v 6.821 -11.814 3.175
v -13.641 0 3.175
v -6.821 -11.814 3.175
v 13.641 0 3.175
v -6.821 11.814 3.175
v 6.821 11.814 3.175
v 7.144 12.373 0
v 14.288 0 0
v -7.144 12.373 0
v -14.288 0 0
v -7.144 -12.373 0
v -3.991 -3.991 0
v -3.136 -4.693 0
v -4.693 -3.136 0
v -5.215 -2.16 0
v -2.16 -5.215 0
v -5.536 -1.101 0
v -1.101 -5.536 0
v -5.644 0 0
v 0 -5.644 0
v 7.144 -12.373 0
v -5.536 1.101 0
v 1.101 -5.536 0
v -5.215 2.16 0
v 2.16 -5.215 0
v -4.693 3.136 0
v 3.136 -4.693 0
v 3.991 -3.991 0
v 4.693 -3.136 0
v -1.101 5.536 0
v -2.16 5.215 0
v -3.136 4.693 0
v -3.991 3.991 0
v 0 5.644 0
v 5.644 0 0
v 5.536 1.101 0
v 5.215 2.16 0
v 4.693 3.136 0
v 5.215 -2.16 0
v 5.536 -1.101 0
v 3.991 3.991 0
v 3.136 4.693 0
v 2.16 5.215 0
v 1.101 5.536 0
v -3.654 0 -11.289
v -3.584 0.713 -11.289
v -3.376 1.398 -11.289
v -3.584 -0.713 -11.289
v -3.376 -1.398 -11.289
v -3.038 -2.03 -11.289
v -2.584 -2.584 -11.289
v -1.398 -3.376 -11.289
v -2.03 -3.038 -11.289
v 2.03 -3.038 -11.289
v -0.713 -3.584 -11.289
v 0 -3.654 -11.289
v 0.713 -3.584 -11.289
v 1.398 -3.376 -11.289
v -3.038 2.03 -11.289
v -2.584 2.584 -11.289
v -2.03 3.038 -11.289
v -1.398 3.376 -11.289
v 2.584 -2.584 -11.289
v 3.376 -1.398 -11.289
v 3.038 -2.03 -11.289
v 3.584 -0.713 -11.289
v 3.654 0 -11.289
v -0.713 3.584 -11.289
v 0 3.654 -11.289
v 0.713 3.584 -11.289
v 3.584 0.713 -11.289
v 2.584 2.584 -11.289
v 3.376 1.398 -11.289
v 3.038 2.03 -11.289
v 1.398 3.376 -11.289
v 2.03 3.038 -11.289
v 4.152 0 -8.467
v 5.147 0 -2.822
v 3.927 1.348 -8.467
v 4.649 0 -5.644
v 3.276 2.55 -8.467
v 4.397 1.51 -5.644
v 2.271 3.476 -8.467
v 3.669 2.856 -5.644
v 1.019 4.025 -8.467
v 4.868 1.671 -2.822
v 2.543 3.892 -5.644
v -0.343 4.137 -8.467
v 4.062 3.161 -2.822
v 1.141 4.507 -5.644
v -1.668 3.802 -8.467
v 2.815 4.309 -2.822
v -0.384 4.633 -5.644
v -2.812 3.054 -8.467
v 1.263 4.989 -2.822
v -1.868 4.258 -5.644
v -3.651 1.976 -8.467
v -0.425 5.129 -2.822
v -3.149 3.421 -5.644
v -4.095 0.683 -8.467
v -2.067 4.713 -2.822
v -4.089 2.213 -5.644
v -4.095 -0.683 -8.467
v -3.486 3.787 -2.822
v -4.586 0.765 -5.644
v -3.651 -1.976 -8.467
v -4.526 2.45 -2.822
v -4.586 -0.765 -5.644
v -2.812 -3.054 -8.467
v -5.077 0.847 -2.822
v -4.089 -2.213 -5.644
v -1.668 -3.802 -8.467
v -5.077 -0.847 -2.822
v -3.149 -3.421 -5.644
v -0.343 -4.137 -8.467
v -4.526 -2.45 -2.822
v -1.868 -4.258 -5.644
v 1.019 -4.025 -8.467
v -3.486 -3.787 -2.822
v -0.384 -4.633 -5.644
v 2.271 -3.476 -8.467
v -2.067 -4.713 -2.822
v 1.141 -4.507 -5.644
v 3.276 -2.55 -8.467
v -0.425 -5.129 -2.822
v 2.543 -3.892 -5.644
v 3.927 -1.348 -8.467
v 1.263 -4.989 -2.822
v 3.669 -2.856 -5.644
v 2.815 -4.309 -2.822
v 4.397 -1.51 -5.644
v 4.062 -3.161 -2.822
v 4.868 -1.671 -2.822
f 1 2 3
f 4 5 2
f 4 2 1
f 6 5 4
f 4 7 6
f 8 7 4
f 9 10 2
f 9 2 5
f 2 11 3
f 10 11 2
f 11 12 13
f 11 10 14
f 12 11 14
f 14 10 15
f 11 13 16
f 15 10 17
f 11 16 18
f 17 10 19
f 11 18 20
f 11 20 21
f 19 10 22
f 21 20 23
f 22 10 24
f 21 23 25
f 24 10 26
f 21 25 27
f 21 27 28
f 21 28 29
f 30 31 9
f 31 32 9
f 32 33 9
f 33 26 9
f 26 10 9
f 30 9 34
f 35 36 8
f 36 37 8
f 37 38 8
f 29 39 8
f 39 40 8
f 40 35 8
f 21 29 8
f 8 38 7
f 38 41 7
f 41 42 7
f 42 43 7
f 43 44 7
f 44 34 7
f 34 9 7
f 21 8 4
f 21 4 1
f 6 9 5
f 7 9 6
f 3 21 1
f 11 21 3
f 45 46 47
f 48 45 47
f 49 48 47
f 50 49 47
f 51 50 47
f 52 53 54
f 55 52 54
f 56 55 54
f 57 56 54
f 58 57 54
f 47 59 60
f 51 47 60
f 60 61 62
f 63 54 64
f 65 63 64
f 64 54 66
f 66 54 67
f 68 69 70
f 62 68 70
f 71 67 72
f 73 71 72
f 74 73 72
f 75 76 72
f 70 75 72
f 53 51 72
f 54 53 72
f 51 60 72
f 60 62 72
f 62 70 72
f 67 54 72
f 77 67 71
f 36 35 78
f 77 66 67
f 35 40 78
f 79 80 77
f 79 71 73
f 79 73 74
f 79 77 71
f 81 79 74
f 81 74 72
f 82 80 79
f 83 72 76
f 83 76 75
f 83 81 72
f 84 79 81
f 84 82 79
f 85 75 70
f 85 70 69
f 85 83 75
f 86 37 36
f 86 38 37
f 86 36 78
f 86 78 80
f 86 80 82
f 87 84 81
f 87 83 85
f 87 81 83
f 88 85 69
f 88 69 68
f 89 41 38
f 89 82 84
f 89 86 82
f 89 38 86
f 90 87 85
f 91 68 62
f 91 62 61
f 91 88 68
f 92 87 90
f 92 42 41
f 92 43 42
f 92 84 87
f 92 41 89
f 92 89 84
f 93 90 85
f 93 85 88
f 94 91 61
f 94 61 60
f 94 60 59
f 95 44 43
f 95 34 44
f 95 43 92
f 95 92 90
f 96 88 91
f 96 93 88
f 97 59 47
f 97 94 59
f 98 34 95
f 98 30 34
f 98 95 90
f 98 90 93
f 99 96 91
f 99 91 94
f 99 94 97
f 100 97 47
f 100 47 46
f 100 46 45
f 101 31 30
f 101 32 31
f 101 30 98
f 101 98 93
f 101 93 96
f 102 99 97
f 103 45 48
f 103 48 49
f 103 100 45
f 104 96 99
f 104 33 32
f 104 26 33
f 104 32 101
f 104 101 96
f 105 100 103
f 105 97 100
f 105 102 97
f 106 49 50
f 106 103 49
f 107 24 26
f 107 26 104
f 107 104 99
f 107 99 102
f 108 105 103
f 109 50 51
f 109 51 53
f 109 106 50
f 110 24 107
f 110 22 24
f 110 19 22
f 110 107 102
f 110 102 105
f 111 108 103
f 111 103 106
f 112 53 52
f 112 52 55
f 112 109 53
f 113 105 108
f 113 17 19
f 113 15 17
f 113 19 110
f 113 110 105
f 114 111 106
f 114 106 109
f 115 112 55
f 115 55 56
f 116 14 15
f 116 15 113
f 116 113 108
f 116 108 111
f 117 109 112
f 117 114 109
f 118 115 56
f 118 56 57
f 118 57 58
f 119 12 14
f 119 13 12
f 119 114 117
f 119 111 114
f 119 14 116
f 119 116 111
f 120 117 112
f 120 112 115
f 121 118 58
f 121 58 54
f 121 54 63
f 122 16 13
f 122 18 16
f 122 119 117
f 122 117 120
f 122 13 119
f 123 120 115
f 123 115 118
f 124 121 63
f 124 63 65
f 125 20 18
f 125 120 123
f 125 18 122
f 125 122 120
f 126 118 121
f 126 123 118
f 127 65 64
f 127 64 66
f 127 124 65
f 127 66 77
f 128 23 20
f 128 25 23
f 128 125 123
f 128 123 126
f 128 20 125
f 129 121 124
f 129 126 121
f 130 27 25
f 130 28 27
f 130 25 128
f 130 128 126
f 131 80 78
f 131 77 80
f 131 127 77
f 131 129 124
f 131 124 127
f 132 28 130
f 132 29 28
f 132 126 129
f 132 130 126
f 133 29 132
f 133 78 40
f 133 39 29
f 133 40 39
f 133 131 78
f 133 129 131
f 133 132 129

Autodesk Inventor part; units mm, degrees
ref_plane "YZ Plane" through (0, 0, 0) normal (1, 0, 0) x (0, 1, 0)
ref_plane "XZ Plane" through (0, 0, 0) normal (0, 1, 0) x (-1, 0, 0)
ref_plane "XY Plane" through (0, 0, 0) normal (0, 0, 1) x (1, 0, 0)
sketch "Sketch1" plane through (0, 0, 0) normal (0, 0, 1) x (1, 0, 0)
  circle A0 centre (0, 0) radius 5.644444
  dimension "d0" = 11.28889
extrude "Extrusion1" add sketch "Sketch1" against normal blind 11.288889 draft -10
sketch "Sketch3" plane through (0, 0, 0) normal (0, 0, 1) x (1, 0, 0)
  circle A0 centre (0, 0) radius 3.653909
  line L0 (-14.2875, 0) -> (-7.14375, 12.373338)
  line L1 (-7.14375, 12.373338) -> (7.14375, 12.373338)
  line L2 (7.14375, 12.373338) -> (14.2875, 0)
  line L3 (14.2875, 0) -> (7.14375, -12.373338)
  line L4 (7.14375, -12.373338) -> (-7.14375, -12.373338)
  line L5 (-7.14375, -12.373338) -> (-14.2875, 0)
  line L6 (0, 0) -> (-14.2875, 0) construction
  dimension "d11" = 28.575
sketch "Sketch3 outline for Extrusion3" plane through (0, 0, 0) normal (0, 0, 1) x (1, 0, 0)
  line L0 (-14.2875, 0) -> (-7.14375, 12.373338)
  line L1 (-7.14375, 12.373338) -> (7.14375, 12.373338)
  line L2 (7.14375, 12.373338) -> (14.2875, 0)
  line L3 (14.2875, 0) -> (7.14375, -12.373338)
  line L4 (7.14375, -12.373338) -> (-7.14375, -12.373338)
  line L5 (-7.14375, -12.373338) -> (-14.2875, 0)
extrude "Extrusion3" add sketch "Sketch3 outline for Extrusion3" along normal blind 3.175 draft -10
properties part number "Driven Pin"
